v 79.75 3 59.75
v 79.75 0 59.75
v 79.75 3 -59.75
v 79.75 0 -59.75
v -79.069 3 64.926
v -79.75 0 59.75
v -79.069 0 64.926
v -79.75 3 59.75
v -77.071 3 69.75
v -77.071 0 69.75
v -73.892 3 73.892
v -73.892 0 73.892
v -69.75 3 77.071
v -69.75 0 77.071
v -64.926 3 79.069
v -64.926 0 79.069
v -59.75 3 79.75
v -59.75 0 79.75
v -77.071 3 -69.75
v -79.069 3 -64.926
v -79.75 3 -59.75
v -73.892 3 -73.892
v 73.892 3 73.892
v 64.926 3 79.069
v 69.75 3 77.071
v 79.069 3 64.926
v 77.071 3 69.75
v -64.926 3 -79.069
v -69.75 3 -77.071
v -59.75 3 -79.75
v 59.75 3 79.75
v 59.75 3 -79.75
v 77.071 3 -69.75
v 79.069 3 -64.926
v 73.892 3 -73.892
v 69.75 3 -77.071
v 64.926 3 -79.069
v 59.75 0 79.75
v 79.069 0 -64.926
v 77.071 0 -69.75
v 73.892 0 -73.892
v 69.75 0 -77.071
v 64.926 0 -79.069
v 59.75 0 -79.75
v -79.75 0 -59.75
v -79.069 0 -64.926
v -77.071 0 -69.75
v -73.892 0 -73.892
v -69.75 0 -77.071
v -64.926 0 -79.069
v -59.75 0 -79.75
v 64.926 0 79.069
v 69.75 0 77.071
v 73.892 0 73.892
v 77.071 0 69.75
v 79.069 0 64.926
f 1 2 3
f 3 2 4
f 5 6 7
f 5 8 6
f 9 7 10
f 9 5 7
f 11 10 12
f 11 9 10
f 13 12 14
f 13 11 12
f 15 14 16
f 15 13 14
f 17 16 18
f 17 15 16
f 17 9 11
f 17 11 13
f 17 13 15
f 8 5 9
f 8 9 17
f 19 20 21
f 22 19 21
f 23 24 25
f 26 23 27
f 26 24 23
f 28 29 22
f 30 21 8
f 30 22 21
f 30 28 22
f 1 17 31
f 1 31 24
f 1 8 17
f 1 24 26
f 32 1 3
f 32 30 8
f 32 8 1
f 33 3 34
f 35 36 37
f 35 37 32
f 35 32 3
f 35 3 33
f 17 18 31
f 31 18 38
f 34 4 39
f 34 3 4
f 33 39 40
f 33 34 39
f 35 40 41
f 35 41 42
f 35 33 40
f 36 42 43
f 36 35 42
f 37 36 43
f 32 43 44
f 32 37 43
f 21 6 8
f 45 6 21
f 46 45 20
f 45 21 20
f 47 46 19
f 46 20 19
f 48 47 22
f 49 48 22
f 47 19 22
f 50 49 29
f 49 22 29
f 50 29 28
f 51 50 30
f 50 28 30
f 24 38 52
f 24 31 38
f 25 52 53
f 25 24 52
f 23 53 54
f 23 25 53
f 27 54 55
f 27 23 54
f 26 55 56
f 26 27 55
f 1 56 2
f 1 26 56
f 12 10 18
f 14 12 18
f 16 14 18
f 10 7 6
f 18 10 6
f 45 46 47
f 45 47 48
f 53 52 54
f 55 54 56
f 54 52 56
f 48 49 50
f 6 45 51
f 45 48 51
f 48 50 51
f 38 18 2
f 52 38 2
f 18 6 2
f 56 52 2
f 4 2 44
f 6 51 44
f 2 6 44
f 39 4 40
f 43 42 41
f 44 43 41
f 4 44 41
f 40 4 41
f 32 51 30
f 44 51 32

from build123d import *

# Parameters (mm, degrees)
SKETCH_1_W      = 159.5
SKETCH_1_H      = 159.5
EXTRUDE_1_DEPTH = 3
FILLET_1_R      = 20


with BuildPart() as part:
    # 草图1 → 凸台-拉伸1 (new body)
    with BuildSketch(Plane(origin=(0, 0, 0), x_dir=(1, 0, 0), z_dir=(0, 1, 0))):
        Rectangle(SKETCH_1_W, SKETCH_1_H)
    extrude(amount=EXTRUDE_1_DEPTH)

    # 圆角1
    fillet_1_edges = [part.edges().sort_by_distance(p)[0] for p in [
        (-79.75, 1.5, -79.75),
        (79.75, 1.5, -79.75),
        (79.75, 1.5, 79.75),
        (-79.75, 1.5, 79.75),
    ]]
    fillet(fillet_1_edges, radius=FILLET_1_R)


solid = part.part
